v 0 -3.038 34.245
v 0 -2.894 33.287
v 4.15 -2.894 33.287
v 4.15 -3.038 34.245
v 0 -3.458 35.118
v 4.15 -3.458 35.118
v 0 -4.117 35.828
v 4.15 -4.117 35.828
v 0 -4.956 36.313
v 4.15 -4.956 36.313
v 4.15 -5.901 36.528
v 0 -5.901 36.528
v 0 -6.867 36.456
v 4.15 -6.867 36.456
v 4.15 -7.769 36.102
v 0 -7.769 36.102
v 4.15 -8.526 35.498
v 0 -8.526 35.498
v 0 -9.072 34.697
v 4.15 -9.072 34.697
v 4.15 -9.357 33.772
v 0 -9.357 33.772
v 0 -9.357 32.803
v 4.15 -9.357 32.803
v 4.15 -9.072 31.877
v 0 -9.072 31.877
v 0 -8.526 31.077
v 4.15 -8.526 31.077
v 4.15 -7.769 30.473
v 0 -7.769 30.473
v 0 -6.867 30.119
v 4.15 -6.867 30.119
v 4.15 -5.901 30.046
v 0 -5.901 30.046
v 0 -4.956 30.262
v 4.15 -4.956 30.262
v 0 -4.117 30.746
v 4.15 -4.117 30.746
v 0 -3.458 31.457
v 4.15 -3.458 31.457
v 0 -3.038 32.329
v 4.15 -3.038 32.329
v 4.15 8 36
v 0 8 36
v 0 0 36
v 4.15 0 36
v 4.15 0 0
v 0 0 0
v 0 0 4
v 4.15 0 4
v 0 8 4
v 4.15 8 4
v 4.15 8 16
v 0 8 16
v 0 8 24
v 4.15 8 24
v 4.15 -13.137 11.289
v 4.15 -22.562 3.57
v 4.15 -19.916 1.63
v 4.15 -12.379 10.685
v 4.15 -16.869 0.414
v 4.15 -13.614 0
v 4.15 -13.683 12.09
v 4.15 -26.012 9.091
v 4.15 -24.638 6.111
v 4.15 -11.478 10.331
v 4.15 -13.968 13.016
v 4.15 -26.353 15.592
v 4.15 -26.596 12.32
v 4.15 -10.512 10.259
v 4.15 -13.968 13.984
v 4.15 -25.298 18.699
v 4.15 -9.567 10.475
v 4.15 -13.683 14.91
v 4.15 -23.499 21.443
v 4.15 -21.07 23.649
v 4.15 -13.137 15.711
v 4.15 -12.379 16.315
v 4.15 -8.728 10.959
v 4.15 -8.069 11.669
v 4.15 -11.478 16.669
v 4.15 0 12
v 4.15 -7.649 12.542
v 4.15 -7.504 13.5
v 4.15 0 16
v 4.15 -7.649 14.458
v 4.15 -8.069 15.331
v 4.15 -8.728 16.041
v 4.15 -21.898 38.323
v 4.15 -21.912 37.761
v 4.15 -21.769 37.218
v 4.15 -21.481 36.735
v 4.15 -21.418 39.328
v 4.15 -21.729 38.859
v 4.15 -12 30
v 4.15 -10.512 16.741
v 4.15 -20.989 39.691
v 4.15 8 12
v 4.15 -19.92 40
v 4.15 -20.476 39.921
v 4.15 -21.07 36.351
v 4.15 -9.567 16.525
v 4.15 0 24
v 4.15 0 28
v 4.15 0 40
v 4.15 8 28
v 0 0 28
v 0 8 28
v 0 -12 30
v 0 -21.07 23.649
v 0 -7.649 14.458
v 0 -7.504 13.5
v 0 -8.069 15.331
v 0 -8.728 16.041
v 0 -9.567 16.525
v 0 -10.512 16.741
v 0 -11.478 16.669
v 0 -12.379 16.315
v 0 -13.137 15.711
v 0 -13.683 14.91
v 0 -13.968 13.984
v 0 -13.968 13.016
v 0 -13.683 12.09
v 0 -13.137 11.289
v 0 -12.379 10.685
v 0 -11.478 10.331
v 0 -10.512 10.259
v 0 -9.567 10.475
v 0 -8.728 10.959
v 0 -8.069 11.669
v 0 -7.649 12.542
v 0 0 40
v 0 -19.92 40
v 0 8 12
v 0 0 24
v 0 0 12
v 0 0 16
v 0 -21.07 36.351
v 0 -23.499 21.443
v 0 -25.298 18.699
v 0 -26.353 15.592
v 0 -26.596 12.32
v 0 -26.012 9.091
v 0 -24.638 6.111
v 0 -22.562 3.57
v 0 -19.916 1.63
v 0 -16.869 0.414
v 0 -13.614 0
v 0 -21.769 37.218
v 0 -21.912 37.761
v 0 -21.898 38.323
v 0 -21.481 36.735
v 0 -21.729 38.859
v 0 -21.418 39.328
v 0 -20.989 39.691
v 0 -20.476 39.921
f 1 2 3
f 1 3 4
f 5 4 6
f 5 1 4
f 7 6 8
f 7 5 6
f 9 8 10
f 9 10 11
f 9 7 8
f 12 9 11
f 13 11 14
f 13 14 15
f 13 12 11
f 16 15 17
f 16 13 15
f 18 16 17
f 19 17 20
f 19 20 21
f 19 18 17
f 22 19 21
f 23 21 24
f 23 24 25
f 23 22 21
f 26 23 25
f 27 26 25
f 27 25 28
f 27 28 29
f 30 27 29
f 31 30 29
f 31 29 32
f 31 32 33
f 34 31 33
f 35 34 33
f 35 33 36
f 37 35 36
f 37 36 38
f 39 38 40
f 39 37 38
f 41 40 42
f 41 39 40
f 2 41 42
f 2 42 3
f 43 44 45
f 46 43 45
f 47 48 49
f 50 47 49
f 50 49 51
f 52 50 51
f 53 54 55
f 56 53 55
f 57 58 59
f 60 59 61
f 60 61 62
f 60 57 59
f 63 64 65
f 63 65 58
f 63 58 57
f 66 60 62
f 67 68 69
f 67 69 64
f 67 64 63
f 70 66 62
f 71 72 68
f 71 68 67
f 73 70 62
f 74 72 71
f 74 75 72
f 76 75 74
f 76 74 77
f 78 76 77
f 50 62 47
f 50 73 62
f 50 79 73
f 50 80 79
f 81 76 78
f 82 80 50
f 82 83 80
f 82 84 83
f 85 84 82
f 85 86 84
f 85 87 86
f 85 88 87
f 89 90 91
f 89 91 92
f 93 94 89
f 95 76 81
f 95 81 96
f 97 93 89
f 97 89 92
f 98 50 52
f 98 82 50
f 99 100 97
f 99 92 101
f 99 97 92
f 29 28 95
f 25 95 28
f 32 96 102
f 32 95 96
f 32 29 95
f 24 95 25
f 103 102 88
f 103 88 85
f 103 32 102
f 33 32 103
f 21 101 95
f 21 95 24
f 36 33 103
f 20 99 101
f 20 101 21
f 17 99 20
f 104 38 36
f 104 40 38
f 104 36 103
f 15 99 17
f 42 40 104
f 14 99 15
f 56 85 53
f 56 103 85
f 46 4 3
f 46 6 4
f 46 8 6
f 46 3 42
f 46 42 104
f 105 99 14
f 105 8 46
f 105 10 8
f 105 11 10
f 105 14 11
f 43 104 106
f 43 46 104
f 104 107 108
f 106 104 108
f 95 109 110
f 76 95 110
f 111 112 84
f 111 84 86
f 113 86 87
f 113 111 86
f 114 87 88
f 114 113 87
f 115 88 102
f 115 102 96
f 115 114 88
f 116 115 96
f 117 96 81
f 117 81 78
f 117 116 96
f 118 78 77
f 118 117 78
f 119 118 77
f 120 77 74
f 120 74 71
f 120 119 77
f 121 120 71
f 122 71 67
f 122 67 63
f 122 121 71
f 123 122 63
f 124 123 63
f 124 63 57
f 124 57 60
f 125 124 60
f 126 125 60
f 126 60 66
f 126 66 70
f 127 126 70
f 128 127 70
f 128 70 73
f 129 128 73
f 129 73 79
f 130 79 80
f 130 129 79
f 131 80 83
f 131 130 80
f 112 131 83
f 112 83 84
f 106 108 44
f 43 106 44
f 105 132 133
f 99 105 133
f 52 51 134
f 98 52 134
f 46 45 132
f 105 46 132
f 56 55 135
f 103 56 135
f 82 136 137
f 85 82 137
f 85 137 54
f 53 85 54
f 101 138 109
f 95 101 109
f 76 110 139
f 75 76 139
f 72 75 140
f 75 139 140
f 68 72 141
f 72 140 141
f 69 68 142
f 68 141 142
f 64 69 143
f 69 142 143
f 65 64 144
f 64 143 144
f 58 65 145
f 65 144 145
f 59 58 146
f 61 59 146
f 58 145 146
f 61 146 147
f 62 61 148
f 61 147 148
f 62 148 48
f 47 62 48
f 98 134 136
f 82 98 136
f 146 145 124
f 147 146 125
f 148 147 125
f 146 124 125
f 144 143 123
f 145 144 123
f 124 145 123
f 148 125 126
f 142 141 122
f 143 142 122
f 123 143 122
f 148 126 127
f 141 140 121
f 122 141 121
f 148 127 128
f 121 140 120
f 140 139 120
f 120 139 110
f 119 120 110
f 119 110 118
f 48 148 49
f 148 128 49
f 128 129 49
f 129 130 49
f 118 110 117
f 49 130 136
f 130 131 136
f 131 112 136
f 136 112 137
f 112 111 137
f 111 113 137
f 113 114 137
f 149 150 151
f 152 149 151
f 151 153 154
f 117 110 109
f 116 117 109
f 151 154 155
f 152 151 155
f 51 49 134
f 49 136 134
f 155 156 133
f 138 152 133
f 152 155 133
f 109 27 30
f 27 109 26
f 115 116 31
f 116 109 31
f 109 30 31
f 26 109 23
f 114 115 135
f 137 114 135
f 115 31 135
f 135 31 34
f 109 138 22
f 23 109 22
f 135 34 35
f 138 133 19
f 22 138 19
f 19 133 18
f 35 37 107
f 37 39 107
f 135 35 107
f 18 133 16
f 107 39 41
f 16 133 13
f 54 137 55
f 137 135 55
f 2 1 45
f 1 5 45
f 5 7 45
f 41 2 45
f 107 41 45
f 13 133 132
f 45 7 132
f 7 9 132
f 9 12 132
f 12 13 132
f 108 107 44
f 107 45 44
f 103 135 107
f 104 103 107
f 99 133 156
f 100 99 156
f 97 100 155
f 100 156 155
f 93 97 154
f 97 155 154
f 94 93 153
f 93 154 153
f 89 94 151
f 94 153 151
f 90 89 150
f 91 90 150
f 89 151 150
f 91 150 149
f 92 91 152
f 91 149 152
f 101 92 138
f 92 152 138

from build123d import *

# Parameters (mm, degrees)
F0_R     = 3.25
F1_DEPTH = 4.15


with BuildPart() as f1:
    # F0 (on Right) → F1 (new body)
    with BuildSketch(Plane.YZ):
        with BuildLine():
            Line((-13.613708, 0), (0, 0))
            Line((0, 0), (0, 4))
            Line((0, 4), (8, 4))
            Line((8, 4), (8, 12))
            Line((8, 12), (0, 12))
            Line((0, 12), (0, 16))
            Line((0, 16), (8, 16))
            Line((8, 16), (8, 24))
            Line((8, 24), (0, 24))
            Line((0, 24), (0, 28))
            Line((0, 28), (8, 28))
            Line((8, 28), (8, 36))
            Line((8, 36), (0, 36))
            Line((0, 36), (0, 40))
            Line((0, 40), (-19.919684, 40))
            ThreePointArc((-19.919684, 40), (-21.832713, 38.597309), (-21.070201, 36.351023))
            Line((-21.070201, 36.351023), (-12, 30))
            Line((-12, 30), (-21.070201, 23.648977))
            ThreePointArc((-21.070201, 23.648977), (-26.012028, 9.090825), (-13.613708, 0))
        make_face()
        with Locations((-10.754399, 13.5)):
            Circle(F0_R, mode=Mode.SUBTRACT)
        with Locations((-6.143649, 33.287299)):
            Circle(F0_R, mode=Mode.SUBTRACT)
    extrude(amount=F1_DEPTH)


solid = f1.part
